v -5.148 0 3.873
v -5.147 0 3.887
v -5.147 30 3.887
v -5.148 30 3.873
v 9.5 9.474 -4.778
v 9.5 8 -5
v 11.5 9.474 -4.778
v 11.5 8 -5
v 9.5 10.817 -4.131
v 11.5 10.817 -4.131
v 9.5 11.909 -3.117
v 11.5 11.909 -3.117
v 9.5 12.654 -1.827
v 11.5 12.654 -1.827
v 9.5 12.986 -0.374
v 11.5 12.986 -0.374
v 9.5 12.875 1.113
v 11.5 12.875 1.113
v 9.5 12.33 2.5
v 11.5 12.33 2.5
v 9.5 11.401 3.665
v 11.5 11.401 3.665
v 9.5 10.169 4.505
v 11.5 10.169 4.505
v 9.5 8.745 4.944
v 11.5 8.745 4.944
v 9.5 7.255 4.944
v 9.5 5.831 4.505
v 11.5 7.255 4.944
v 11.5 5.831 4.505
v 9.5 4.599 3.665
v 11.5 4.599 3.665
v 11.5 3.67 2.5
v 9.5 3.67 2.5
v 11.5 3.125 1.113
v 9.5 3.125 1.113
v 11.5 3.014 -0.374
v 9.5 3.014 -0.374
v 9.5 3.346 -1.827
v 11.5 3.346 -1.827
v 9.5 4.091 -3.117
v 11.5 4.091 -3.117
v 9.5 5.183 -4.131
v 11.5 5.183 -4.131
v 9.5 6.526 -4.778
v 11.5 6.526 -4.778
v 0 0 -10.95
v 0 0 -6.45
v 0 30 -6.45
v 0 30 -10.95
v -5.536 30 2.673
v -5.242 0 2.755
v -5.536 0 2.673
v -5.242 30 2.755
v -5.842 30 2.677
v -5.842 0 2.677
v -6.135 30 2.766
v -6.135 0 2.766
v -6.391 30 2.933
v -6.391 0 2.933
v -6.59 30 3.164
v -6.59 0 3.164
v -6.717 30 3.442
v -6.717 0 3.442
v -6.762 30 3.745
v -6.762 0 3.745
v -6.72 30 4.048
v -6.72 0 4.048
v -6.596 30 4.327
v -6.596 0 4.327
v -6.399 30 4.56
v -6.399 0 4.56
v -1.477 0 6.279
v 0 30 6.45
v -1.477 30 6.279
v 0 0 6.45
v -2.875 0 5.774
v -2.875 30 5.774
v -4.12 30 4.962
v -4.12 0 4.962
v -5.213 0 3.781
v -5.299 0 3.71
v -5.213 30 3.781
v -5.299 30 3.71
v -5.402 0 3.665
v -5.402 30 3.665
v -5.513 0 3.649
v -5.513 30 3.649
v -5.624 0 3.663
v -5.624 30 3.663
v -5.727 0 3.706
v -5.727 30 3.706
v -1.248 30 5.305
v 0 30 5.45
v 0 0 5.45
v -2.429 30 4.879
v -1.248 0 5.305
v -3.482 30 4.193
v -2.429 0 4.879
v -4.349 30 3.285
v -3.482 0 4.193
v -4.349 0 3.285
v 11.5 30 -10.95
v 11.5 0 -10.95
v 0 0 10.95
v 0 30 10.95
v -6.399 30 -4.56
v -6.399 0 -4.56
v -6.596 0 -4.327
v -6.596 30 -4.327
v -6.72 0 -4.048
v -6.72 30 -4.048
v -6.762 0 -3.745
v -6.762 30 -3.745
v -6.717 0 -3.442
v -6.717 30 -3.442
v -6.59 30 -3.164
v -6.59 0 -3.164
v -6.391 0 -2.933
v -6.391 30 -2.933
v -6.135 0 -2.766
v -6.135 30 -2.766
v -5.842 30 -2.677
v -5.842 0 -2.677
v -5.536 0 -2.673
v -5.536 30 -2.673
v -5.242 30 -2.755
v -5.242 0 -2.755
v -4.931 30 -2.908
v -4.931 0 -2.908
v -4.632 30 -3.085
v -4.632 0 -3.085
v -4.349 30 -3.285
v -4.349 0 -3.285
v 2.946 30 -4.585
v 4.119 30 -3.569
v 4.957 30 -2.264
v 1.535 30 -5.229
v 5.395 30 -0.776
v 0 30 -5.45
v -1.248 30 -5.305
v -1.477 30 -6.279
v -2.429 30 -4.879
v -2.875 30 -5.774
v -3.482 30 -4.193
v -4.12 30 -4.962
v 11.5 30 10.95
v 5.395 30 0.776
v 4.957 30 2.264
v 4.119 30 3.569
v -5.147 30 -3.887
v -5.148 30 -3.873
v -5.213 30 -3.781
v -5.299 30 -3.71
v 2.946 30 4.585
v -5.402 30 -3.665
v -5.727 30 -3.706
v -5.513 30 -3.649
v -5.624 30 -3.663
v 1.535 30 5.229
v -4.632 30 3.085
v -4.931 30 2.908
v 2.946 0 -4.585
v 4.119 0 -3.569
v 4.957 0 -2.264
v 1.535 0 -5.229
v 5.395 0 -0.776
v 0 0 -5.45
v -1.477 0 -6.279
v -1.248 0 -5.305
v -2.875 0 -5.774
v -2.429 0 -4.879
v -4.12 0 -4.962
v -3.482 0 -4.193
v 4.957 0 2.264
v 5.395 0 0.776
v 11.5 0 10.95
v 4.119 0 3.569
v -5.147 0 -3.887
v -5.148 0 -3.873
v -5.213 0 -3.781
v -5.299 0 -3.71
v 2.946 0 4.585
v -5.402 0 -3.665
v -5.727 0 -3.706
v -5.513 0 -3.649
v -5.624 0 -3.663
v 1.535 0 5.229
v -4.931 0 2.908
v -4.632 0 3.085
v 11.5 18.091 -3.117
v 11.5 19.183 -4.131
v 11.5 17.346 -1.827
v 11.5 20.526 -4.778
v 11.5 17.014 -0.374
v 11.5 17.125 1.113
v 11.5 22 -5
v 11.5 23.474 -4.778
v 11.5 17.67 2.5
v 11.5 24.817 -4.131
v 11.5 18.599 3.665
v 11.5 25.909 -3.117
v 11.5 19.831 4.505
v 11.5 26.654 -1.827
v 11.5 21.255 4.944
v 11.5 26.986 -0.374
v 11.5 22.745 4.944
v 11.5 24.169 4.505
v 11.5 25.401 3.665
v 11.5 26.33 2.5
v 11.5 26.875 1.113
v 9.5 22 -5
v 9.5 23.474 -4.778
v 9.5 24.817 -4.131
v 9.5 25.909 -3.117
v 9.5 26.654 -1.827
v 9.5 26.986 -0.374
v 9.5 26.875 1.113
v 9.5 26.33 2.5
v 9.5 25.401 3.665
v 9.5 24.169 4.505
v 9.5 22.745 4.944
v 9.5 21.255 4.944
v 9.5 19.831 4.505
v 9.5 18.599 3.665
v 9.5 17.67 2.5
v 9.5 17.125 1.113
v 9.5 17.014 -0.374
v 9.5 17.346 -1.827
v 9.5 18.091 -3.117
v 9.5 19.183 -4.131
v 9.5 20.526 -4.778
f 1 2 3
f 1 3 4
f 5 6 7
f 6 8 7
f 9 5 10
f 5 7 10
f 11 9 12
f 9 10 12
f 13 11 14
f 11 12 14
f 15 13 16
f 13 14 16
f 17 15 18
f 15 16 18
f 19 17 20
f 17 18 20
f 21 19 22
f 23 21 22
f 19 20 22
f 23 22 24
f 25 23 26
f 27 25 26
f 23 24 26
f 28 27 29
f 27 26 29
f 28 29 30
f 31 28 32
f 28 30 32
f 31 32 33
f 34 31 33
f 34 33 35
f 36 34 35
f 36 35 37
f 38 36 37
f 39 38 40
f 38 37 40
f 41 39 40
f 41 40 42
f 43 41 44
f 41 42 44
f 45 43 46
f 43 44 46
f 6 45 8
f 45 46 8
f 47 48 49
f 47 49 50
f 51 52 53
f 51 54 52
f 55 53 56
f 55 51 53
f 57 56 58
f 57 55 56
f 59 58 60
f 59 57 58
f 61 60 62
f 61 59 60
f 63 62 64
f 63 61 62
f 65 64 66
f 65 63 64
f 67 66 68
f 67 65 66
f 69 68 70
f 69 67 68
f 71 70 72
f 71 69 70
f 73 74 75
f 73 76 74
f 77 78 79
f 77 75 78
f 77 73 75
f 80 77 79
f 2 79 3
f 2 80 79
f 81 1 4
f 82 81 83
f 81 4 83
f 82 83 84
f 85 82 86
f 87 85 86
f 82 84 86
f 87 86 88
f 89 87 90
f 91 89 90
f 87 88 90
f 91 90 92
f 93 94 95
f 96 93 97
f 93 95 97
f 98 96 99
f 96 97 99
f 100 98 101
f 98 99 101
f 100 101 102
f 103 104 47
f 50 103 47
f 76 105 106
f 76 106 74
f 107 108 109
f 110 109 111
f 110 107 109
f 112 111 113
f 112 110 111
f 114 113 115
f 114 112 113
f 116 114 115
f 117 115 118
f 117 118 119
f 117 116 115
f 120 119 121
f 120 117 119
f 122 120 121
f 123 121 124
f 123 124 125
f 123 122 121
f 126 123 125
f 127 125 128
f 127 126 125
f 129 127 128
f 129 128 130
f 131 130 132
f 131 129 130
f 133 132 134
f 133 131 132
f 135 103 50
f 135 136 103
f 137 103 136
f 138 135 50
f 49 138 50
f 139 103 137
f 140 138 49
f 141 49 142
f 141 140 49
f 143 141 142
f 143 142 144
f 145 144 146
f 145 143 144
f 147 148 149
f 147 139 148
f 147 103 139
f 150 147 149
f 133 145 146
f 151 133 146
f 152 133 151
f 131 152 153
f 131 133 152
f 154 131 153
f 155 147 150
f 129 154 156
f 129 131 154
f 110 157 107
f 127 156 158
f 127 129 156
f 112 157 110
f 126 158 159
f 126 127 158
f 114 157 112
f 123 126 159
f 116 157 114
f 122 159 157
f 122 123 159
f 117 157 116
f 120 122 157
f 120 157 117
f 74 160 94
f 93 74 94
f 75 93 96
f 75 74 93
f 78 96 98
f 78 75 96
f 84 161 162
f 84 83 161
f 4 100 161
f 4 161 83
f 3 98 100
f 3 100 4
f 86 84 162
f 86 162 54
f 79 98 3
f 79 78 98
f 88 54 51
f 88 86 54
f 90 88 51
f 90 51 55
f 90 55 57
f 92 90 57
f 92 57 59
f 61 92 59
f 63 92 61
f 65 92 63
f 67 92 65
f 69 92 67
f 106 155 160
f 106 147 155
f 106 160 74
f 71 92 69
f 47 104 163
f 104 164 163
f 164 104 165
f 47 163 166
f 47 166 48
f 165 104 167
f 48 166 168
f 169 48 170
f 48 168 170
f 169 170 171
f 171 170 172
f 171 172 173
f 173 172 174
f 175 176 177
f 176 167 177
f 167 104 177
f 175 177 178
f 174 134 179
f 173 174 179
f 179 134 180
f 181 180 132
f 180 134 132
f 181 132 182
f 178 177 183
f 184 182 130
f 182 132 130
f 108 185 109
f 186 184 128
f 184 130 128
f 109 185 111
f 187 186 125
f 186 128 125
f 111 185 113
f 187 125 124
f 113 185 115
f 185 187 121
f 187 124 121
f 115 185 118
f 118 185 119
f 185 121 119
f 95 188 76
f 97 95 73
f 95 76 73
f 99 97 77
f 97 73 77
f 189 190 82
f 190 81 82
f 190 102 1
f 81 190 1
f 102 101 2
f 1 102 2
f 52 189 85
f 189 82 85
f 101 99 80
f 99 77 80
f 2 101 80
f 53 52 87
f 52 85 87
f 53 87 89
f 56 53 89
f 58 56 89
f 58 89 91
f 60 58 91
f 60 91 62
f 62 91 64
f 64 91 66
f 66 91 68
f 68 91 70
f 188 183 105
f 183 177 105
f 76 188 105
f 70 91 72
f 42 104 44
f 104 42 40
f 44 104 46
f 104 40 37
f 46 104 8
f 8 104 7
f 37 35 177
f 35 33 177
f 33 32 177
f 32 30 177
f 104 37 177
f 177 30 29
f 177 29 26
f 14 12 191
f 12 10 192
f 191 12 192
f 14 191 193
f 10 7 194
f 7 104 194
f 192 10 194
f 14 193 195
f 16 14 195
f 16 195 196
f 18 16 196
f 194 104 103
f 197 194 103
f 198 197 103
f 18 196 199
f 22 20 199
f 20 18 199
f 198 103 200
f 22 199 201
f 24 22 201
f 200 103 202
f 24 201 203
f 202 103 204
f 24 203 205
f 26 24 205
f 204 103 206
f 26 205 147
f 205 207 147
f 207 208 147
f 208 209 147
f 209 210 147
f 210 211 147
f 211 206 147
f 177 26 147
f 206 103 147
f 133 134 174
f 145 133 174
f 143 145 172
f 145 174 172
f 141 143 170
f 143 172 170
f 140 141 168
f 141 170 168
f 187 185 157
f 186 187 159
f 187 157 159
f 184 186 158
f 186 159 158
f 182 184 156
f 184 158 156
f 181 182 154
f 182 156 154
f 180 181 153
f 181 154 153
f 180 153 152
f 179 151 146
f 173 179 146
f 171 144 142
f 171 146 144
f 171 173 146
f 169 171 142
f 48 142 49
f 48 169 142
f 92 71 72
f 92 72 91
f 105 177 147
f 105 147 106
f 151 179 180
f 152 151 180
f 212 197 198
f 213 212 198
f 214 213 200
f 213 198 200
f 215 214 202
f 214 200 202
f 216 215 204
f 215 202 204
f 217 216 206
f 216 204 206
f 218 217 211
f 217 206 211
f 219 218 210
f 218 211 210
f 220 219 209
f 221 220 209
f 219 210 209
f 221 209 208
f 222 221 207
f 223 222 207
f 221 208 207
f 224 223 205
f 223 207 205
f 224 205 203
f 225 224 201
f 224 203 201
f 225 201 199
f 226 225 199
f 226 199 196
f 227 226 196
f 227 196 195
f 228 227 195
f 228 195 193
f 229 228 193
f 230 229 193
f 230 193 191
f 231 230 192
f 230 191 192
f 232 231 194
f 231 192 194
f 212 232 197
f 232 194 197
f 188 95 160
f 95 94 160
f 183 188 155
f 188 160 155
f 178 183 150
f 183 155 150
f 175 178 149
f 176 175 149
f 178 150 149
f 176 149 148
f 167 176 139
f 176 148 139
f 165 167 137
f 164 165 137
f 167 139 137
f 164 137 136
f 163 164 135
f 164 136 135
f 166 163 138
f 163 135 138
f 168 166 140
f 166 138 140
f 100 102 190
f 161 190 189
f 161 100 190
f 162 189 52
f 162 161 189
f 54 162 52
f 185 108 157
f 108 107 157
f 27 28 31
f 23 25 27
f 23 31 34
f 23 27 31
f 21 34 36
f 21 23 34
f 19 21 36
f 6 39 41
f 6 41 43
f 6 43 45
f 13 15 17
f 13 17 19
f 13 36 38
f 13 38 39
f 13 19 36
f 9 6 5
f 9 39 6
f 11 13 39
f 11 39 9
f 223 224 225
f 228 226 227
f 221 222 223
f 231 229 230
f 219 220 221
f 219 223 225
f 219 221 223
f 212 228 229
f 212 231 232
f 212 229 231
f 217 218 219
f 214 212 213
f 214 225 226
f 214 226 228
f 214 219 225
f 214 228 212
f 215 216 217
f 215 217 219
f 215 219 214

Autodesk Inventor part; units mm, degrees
ref_plane "YZ Plane" through (0, 0, 0) normal (1, 0, 0) x (0, 1, 0)
ref_plane "XZ Plane" through (0, 0, 0) normal (0, 1, 0) x (-1, 0, 0)
ref_plane "XY Plane" through (0, 0, 0) normal (0, 0, 1) x (1, 0, 0)
sketch "Эскиз1" plane through (0, 0, 0) normal (0, 1, 0) x (-1, 0, 0)
  circle A0 centre (0, 0) radius 5.45
  circle A1 centre (0, 0) radius 6.45
  line L0 (0, 0) -> (5.147, 3.8873)
  line L1 (0, 0) -> (5.147, -3.8873)
  point P0 (4.349, -3.2846)
  point P1 (4.349, 3.2846)
  dimension "d0" = 10.9
  dimension "d1" = 12.9
extrude "Выдавливание1" add sketch "Эскиз1" along normal blind 30 contours A0 L1 A1 L0 picked at (4.1928, 4.3939)
sketch "Эскиз2" plane through (0, 30, 0) normal (0, 1, 0) x (1, 0, 0)
  arc A0 (-4.349, -3.2846) -> (-5.2417, -2.7547) centre (-7.0503, -6.8185) ccw
  arc A1 (-5.2417, -2.7547) -> (-6.3986, -4.5605) centre (-5.676, -3.75) ccw
  line L0 (-6.3986, -4.5605) -> (-5.7273, -3.706)
  arc A2 (-5.1484, -3.8728) -> (-5.7273, -3.706) centre (-5.5167, -4.0632) ccw
  line L1 (-4.349, -3.2846) -> (-5.147, -3.8873)
  line L2 (-5.147, -3.8873) -> (-4.349, -3.2846)
  line L3 (-5.147, -3.8873) -> (-5.1484, -3.8728)
  line L4 (-0.0151, 0) -> (-3.489, 0)
  arc A3 (-5.2417, 2.7547) -> (-4.349, 3.2846) centre (-7.0503, 6.8185) ccw
  arc A4 (-5.7273, 3.706) -> (-5.1484, 3.8728) centre (-5.5167, 4.0632) ccw
  line L5 (-4.349, 3.2846) -> (-5.147, 3.8873)
  line L6 (-5.147, 3.8873) -> (-4.349, 3.2846)
  line L7 (-5.147, 3.8873) -> (-5.1484, 3.8728)
  arc A5 (-6.3986, 4.5605) -> (-5.2417, 2.7547) centre (-5.676, 3.75) ccw
  line L8 (-6.3986, 4.5605) -> (-5.7273, 3.706)
  point P0 (-5.3694, -4.0591)
  point P1 (-5.147, 3.8873)
  point P2 (-5.3694, 4.0591)
  point P3 (-5.147, 3.8873)
  dimension "d25" = 1.0859
sketch "Эскиз3" plane through (0, 30, 0) normal (0, 1, 0) x (1, 0, 0)
  arc A0 (-5.147, -3.8873) -> (-5.147, 3.8873) centre (0, 0) ccw projected
  line L0 (11.5, -6.95) -> (11.5, 6.95)
  arc A1 (-4.349, -3.2846) -> (-4.349, 3.2846) centre (0, 0) ccw projected
  line L1 (0, -6.45) -> (0, -5.45)
  line L2 (0, 5.45) -> (0, 6.45)
  line L3 (11.5, 6.95) -> (11.5, 10.95)
  line L4 (11.5, -6.95) -> (11.5, -10.95)
  line L5 (0, 1.95) -> (0, 6.45)
  line L6 (11.5, -10.95) -> (0, -10.95)
  line L7 (0, -10.95) -> (0, -6.45)
  line L8 (11.5, 10.95) -> (0, 10.95)
  line L9 (0, 10.95) -> (0, 6.45)
  arc A2 (0, -5.45) -> (0, 5.45) centre (0, 0) ccw
  dimension "d13" = 4
  dimension "d14" = 4
  dimension "d22" = 21.9
  dimension "d23" = 5.5
extrude "Выдавливание3" add sketch "Эскиз3" against normal blind 30
ref_plane "РабПлоскость1" through (11.5, 20, 4.95) normal (1, 0, 0) x (0, 0, -1)
sketch "Эскиз4" plane through (11.5, 20, 4.95) normal (1, 0, 0) x (0, 0, -1)
  line L0 (4.95, -20) -> (4.95, 10)
  line L1 (1, 10) -> (8.9, 10) projected
  circle A0 centre (4.95, -12) radius 5
  line L2 (14.4, -20) -> (-4.5, -20) projected
  circle A1 centre (4.95, 2) radius 5
  line L3 (-4.5, 10) -> (14.4, 10) projected
  point P0 (7.3306, 10)
  point P1 (2.5694, 10)
  point P2 (4.95, 10)
  dimension "d15" = 10
  dimension "d16" = 8
  dimension "d17" = 10
  dimension "d18" = 8
extrude "Выдавливание4" cut sketch "Эскиз4" against normal blind 2
extrude "Выдавливание5" add sketch "Эскиз2" against normal blind 30
sketch "Эскиз5" plane through (0, 30, 0) normal (0, 1, 0) x (1, 0, 0)
  arc A0 (0, 6.45) -> (-5.147, 3.8873) centre (0, 0) ccw projected
  line L0 (-5.147, 3.8873) -> (-5.1484, 3.8728) projected
  arc A1 (-5.7273, 3.706) -> (-5.1484, 3.8728) centre (-5.5167, 4.0632) ccw projected
  line L1 (-5.7273, 3.706) -> (-6.3986, 4.5605) projected
  arc A2 (-6.3986, 4.5605) -> (-5.2417, 2.7547) centre (-5.676, 3.75) ccw projected
  arc A3 (-5.2417, 2.7547) -> (-4.349, 3.2846) centre (-7.0503, 6.8185) ccw projected
  arc A4 (-4.349, -3.2846) -> (-4.349, 3.2846) centre (0, 0) ccw projected
  arc A5 (-4.349, -3.2846) -> (-5.2417, -2.7547) centre (-7.0503, -6.8185) ccw projected
  arc A6 (-5.2417, -2.7547) -> (-6.3986, -4.5605) centre (-5.676, -3.75) ccw projected
  line L2 (-6.3986, -4.5605) -> (-5.7273, -3.706) projected
  arc A7 (-5.1484, -3.8728) -> (-5.7273, -3.706) centre (-5.5167, -4.0632) ccw projected
  line L3 (-5.1484, -3.8728) -> (-5.147, -3.8873) projected
  arc A8 (-5.147, -3.8873) -> (0, -6.45) centre (0, 0) ccw projected
  line L4 (0, -6.45) -> (0, -10.95) projected
  line L5 (0, -10.95) -> (11.5, -10.95) projected
  line L6 (11.5, -10.95) -> (11.5, 10.95) projected
  line L7 (11.5, 10.95) -> (0, 10.95) projected
  line L8 (0, 10.95) -> (0, 6.45) projected
  line L9 (0, 5.45) -> (0, 6.45)
  line L10 (0, -5.45) -> (0, -6.45)
extrude "Выдавливание6" [suppressed]
sketch "Эскиз6" plane through (11.5, 30, 10.95) normal (1, 0, 0) x (0, 0, -1)
  arc A0 (15.95, -22) -> (15.95, -22) centre (10.95, -22) ccw projected
  arc A1 (15.95, -8) -> (15.95, -8) centre (10.95, -8) ccw projected
  point P0 (10.95, -30)
extrude "Выдавливание7" [suppressed]
properties part number "крепление маркера 11мм"
